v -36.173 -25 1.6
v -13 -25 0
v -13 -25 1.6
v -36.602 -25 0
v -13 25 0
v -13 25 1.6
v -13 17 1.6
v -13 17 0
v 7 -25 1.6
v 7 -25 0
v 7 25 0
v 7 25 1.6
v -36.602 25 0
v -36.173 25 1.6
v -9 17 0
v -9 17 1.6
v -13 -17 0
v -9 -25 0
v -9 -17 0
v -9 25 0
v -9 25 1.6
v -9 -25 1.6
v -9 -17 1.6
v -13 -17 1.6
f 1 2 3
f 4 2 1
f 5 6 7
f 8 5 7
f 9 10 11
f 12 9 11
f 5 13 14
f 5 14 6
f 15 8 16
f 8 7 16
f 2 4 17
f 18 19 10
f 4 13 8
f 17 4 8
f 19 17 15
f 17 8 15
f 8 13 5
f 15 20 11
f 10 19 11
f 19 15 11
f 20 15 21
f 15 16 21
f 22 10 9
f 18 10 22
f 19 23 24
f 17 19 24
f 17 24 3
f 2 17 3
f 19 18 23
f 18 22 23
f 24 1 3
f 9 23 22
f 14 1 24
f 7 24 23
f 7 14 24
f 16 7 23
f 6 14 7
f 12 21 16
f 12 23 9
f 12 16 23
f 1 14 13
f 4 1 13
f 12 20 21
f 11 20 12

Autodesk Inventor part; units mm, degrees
ref_plane "YZ Plane" through (0, 0, 0) normal (1, 0, 0) x (0, 1, 0)
ref_plane "XZ Plane" through (0, 0, 0) normal (0, 1, 0) x (-1, 0, 0)
ref_plane "XY Plane" through (0, 0, 0) normal (0, 0, 1) x (1, 0, 0)
sketch "Szkic1" plane through (0, 0, 0) normal (0, 0, 1) x (1, 0, 0)
  line L0 (-43, 25) -> (-7, 25) projected
  line L1 (-7, 25) -> (-7, 11) projected
  line L2 (-7, 11) -> (7, 11) projected
  line L3 (7, 11) -> (7, -11) projected
  line L4 (7, -11) -> (-7, -11) projected
  line L5 (-7, -11) -> (-7, -25) projected
  line L6 (-7, -25) -> (-43, -25) projected
  line L7 (-7, -11) -> (7, -11)
  line L8 (7, -11) -> (7, -25)
  line L9 (7, -25) -> (-7, -25)
  line L10 (-7, -25) -> (-7, -11)
  line L11 (-7, 11) -> (7, 11)
  line L12 (7, 11) -> (7, 25)
  line L13 (7, 25) -> (-7, 25)
  line L14 (-7, 25) -> (-7, 11)
  line L15 (-43, -25) -> (-43, 25) projected
  point P0 (0, 0)
  point P1 (7, 11)
  point P2 (7, 11)
extrude "Wyciągnięcie proste1" add sketch "Szkic1" along normal blind 1.6
ref_plane "Płaszczyzna konstrukcyjna1" through (-17.9997, 25, -4.7) normal (0, 1, 0) x (0, 0, 1)
sketch "Szkic3" plane through (0, 0, 1.6) normal (0, 0, 1) x (1, 0, 0)
  line L0 (-43, -25) -> (7, -25) projected
  line L1 (7, -25) -> (7, 25) projected
  line L2 (7, 25) -> (-43, 25) projected
  line L3 (-13, -25) -> (-9, -25)
  line L4 (-9, -25) -> (-9, -17)
  line L5 (-9, -17) -> (-13, -17)
  line L6 (-13, -17) -> (-13, -25)
  line L7 (7, 25) -> (-40.2936, 25) projected
  line L8 (-9, 25) -> (-13, 25)
  line L9 (-13, 25) -> (-13, 17)
  line L10 (-13, 17) -> (-9, 17)
  line L11 (-9, 17) -> (-9, 25)
  line L12 (-43, 25) -> (-43, -25) projected
  point P0 (0, 0)
  point P1 (-35.2314, 25)
  point P2 (-35.7424, 25)
  point P3 (-11, 25)
  dimension "d4" = 16
  dimension "d5" = 16
  dimension "d6" = 8
  dimension "d7" = 8
  dimension "d8" = 4
  dimension "d9" = 4
extrude "Wyciągnięcie proste3" cut sketch "Szkic3" against normal through all contours L6 L5 L4 L0 | L2 L11 L10 L9
sketch "Szkic4" plane through (-40.2936, 25, 1.6) normal (0, 1, 0) x (1, 0, 0)
  line L0 (4.9241, -3) -> (-0.6358, 17.75) projected
  line L1 (-0.6358, 17.75) -> (-2.7064, 17.75) projected
  line L2 (-2.7064, 17.75) -> (2.8536, -3) projected
  line L3 (2.8536, -3) -> (4.9241, -3) projected
  line L4 (27.2936, 0) -> (27.2936, 1.6) projected
  line L5 (47.2936, 1.6) -> (31.2936, 1.6) projected
  line L6 (27.2936, 0) -> (-2.7064, 0) projected
  line L7 (27.2936, 1.6) -> (-2.7064, 1.6) projected
  line L8 (-2.7064, 1.6) -> (-2.7064, 0) projected
  line L9 (31.2936, 1.6) -> (31.2936, 0) projected
  line L10 (47.2936, 0) -> (31.2936, 0) projected
  line L11 (47.2936, 1.6) -> (47.2936, 0) projected
  point P0 (40.2936, 1.6)
  point P1 (3.6916, 1.6)
  point P2 (4.1203, 0)
extrude "Wyciągnięcie proste4" cut sketch "Szkic4" against normal through all contours L6 L2 L7 L0 | L6 L8 L7 L2
properties part number "pcb"
